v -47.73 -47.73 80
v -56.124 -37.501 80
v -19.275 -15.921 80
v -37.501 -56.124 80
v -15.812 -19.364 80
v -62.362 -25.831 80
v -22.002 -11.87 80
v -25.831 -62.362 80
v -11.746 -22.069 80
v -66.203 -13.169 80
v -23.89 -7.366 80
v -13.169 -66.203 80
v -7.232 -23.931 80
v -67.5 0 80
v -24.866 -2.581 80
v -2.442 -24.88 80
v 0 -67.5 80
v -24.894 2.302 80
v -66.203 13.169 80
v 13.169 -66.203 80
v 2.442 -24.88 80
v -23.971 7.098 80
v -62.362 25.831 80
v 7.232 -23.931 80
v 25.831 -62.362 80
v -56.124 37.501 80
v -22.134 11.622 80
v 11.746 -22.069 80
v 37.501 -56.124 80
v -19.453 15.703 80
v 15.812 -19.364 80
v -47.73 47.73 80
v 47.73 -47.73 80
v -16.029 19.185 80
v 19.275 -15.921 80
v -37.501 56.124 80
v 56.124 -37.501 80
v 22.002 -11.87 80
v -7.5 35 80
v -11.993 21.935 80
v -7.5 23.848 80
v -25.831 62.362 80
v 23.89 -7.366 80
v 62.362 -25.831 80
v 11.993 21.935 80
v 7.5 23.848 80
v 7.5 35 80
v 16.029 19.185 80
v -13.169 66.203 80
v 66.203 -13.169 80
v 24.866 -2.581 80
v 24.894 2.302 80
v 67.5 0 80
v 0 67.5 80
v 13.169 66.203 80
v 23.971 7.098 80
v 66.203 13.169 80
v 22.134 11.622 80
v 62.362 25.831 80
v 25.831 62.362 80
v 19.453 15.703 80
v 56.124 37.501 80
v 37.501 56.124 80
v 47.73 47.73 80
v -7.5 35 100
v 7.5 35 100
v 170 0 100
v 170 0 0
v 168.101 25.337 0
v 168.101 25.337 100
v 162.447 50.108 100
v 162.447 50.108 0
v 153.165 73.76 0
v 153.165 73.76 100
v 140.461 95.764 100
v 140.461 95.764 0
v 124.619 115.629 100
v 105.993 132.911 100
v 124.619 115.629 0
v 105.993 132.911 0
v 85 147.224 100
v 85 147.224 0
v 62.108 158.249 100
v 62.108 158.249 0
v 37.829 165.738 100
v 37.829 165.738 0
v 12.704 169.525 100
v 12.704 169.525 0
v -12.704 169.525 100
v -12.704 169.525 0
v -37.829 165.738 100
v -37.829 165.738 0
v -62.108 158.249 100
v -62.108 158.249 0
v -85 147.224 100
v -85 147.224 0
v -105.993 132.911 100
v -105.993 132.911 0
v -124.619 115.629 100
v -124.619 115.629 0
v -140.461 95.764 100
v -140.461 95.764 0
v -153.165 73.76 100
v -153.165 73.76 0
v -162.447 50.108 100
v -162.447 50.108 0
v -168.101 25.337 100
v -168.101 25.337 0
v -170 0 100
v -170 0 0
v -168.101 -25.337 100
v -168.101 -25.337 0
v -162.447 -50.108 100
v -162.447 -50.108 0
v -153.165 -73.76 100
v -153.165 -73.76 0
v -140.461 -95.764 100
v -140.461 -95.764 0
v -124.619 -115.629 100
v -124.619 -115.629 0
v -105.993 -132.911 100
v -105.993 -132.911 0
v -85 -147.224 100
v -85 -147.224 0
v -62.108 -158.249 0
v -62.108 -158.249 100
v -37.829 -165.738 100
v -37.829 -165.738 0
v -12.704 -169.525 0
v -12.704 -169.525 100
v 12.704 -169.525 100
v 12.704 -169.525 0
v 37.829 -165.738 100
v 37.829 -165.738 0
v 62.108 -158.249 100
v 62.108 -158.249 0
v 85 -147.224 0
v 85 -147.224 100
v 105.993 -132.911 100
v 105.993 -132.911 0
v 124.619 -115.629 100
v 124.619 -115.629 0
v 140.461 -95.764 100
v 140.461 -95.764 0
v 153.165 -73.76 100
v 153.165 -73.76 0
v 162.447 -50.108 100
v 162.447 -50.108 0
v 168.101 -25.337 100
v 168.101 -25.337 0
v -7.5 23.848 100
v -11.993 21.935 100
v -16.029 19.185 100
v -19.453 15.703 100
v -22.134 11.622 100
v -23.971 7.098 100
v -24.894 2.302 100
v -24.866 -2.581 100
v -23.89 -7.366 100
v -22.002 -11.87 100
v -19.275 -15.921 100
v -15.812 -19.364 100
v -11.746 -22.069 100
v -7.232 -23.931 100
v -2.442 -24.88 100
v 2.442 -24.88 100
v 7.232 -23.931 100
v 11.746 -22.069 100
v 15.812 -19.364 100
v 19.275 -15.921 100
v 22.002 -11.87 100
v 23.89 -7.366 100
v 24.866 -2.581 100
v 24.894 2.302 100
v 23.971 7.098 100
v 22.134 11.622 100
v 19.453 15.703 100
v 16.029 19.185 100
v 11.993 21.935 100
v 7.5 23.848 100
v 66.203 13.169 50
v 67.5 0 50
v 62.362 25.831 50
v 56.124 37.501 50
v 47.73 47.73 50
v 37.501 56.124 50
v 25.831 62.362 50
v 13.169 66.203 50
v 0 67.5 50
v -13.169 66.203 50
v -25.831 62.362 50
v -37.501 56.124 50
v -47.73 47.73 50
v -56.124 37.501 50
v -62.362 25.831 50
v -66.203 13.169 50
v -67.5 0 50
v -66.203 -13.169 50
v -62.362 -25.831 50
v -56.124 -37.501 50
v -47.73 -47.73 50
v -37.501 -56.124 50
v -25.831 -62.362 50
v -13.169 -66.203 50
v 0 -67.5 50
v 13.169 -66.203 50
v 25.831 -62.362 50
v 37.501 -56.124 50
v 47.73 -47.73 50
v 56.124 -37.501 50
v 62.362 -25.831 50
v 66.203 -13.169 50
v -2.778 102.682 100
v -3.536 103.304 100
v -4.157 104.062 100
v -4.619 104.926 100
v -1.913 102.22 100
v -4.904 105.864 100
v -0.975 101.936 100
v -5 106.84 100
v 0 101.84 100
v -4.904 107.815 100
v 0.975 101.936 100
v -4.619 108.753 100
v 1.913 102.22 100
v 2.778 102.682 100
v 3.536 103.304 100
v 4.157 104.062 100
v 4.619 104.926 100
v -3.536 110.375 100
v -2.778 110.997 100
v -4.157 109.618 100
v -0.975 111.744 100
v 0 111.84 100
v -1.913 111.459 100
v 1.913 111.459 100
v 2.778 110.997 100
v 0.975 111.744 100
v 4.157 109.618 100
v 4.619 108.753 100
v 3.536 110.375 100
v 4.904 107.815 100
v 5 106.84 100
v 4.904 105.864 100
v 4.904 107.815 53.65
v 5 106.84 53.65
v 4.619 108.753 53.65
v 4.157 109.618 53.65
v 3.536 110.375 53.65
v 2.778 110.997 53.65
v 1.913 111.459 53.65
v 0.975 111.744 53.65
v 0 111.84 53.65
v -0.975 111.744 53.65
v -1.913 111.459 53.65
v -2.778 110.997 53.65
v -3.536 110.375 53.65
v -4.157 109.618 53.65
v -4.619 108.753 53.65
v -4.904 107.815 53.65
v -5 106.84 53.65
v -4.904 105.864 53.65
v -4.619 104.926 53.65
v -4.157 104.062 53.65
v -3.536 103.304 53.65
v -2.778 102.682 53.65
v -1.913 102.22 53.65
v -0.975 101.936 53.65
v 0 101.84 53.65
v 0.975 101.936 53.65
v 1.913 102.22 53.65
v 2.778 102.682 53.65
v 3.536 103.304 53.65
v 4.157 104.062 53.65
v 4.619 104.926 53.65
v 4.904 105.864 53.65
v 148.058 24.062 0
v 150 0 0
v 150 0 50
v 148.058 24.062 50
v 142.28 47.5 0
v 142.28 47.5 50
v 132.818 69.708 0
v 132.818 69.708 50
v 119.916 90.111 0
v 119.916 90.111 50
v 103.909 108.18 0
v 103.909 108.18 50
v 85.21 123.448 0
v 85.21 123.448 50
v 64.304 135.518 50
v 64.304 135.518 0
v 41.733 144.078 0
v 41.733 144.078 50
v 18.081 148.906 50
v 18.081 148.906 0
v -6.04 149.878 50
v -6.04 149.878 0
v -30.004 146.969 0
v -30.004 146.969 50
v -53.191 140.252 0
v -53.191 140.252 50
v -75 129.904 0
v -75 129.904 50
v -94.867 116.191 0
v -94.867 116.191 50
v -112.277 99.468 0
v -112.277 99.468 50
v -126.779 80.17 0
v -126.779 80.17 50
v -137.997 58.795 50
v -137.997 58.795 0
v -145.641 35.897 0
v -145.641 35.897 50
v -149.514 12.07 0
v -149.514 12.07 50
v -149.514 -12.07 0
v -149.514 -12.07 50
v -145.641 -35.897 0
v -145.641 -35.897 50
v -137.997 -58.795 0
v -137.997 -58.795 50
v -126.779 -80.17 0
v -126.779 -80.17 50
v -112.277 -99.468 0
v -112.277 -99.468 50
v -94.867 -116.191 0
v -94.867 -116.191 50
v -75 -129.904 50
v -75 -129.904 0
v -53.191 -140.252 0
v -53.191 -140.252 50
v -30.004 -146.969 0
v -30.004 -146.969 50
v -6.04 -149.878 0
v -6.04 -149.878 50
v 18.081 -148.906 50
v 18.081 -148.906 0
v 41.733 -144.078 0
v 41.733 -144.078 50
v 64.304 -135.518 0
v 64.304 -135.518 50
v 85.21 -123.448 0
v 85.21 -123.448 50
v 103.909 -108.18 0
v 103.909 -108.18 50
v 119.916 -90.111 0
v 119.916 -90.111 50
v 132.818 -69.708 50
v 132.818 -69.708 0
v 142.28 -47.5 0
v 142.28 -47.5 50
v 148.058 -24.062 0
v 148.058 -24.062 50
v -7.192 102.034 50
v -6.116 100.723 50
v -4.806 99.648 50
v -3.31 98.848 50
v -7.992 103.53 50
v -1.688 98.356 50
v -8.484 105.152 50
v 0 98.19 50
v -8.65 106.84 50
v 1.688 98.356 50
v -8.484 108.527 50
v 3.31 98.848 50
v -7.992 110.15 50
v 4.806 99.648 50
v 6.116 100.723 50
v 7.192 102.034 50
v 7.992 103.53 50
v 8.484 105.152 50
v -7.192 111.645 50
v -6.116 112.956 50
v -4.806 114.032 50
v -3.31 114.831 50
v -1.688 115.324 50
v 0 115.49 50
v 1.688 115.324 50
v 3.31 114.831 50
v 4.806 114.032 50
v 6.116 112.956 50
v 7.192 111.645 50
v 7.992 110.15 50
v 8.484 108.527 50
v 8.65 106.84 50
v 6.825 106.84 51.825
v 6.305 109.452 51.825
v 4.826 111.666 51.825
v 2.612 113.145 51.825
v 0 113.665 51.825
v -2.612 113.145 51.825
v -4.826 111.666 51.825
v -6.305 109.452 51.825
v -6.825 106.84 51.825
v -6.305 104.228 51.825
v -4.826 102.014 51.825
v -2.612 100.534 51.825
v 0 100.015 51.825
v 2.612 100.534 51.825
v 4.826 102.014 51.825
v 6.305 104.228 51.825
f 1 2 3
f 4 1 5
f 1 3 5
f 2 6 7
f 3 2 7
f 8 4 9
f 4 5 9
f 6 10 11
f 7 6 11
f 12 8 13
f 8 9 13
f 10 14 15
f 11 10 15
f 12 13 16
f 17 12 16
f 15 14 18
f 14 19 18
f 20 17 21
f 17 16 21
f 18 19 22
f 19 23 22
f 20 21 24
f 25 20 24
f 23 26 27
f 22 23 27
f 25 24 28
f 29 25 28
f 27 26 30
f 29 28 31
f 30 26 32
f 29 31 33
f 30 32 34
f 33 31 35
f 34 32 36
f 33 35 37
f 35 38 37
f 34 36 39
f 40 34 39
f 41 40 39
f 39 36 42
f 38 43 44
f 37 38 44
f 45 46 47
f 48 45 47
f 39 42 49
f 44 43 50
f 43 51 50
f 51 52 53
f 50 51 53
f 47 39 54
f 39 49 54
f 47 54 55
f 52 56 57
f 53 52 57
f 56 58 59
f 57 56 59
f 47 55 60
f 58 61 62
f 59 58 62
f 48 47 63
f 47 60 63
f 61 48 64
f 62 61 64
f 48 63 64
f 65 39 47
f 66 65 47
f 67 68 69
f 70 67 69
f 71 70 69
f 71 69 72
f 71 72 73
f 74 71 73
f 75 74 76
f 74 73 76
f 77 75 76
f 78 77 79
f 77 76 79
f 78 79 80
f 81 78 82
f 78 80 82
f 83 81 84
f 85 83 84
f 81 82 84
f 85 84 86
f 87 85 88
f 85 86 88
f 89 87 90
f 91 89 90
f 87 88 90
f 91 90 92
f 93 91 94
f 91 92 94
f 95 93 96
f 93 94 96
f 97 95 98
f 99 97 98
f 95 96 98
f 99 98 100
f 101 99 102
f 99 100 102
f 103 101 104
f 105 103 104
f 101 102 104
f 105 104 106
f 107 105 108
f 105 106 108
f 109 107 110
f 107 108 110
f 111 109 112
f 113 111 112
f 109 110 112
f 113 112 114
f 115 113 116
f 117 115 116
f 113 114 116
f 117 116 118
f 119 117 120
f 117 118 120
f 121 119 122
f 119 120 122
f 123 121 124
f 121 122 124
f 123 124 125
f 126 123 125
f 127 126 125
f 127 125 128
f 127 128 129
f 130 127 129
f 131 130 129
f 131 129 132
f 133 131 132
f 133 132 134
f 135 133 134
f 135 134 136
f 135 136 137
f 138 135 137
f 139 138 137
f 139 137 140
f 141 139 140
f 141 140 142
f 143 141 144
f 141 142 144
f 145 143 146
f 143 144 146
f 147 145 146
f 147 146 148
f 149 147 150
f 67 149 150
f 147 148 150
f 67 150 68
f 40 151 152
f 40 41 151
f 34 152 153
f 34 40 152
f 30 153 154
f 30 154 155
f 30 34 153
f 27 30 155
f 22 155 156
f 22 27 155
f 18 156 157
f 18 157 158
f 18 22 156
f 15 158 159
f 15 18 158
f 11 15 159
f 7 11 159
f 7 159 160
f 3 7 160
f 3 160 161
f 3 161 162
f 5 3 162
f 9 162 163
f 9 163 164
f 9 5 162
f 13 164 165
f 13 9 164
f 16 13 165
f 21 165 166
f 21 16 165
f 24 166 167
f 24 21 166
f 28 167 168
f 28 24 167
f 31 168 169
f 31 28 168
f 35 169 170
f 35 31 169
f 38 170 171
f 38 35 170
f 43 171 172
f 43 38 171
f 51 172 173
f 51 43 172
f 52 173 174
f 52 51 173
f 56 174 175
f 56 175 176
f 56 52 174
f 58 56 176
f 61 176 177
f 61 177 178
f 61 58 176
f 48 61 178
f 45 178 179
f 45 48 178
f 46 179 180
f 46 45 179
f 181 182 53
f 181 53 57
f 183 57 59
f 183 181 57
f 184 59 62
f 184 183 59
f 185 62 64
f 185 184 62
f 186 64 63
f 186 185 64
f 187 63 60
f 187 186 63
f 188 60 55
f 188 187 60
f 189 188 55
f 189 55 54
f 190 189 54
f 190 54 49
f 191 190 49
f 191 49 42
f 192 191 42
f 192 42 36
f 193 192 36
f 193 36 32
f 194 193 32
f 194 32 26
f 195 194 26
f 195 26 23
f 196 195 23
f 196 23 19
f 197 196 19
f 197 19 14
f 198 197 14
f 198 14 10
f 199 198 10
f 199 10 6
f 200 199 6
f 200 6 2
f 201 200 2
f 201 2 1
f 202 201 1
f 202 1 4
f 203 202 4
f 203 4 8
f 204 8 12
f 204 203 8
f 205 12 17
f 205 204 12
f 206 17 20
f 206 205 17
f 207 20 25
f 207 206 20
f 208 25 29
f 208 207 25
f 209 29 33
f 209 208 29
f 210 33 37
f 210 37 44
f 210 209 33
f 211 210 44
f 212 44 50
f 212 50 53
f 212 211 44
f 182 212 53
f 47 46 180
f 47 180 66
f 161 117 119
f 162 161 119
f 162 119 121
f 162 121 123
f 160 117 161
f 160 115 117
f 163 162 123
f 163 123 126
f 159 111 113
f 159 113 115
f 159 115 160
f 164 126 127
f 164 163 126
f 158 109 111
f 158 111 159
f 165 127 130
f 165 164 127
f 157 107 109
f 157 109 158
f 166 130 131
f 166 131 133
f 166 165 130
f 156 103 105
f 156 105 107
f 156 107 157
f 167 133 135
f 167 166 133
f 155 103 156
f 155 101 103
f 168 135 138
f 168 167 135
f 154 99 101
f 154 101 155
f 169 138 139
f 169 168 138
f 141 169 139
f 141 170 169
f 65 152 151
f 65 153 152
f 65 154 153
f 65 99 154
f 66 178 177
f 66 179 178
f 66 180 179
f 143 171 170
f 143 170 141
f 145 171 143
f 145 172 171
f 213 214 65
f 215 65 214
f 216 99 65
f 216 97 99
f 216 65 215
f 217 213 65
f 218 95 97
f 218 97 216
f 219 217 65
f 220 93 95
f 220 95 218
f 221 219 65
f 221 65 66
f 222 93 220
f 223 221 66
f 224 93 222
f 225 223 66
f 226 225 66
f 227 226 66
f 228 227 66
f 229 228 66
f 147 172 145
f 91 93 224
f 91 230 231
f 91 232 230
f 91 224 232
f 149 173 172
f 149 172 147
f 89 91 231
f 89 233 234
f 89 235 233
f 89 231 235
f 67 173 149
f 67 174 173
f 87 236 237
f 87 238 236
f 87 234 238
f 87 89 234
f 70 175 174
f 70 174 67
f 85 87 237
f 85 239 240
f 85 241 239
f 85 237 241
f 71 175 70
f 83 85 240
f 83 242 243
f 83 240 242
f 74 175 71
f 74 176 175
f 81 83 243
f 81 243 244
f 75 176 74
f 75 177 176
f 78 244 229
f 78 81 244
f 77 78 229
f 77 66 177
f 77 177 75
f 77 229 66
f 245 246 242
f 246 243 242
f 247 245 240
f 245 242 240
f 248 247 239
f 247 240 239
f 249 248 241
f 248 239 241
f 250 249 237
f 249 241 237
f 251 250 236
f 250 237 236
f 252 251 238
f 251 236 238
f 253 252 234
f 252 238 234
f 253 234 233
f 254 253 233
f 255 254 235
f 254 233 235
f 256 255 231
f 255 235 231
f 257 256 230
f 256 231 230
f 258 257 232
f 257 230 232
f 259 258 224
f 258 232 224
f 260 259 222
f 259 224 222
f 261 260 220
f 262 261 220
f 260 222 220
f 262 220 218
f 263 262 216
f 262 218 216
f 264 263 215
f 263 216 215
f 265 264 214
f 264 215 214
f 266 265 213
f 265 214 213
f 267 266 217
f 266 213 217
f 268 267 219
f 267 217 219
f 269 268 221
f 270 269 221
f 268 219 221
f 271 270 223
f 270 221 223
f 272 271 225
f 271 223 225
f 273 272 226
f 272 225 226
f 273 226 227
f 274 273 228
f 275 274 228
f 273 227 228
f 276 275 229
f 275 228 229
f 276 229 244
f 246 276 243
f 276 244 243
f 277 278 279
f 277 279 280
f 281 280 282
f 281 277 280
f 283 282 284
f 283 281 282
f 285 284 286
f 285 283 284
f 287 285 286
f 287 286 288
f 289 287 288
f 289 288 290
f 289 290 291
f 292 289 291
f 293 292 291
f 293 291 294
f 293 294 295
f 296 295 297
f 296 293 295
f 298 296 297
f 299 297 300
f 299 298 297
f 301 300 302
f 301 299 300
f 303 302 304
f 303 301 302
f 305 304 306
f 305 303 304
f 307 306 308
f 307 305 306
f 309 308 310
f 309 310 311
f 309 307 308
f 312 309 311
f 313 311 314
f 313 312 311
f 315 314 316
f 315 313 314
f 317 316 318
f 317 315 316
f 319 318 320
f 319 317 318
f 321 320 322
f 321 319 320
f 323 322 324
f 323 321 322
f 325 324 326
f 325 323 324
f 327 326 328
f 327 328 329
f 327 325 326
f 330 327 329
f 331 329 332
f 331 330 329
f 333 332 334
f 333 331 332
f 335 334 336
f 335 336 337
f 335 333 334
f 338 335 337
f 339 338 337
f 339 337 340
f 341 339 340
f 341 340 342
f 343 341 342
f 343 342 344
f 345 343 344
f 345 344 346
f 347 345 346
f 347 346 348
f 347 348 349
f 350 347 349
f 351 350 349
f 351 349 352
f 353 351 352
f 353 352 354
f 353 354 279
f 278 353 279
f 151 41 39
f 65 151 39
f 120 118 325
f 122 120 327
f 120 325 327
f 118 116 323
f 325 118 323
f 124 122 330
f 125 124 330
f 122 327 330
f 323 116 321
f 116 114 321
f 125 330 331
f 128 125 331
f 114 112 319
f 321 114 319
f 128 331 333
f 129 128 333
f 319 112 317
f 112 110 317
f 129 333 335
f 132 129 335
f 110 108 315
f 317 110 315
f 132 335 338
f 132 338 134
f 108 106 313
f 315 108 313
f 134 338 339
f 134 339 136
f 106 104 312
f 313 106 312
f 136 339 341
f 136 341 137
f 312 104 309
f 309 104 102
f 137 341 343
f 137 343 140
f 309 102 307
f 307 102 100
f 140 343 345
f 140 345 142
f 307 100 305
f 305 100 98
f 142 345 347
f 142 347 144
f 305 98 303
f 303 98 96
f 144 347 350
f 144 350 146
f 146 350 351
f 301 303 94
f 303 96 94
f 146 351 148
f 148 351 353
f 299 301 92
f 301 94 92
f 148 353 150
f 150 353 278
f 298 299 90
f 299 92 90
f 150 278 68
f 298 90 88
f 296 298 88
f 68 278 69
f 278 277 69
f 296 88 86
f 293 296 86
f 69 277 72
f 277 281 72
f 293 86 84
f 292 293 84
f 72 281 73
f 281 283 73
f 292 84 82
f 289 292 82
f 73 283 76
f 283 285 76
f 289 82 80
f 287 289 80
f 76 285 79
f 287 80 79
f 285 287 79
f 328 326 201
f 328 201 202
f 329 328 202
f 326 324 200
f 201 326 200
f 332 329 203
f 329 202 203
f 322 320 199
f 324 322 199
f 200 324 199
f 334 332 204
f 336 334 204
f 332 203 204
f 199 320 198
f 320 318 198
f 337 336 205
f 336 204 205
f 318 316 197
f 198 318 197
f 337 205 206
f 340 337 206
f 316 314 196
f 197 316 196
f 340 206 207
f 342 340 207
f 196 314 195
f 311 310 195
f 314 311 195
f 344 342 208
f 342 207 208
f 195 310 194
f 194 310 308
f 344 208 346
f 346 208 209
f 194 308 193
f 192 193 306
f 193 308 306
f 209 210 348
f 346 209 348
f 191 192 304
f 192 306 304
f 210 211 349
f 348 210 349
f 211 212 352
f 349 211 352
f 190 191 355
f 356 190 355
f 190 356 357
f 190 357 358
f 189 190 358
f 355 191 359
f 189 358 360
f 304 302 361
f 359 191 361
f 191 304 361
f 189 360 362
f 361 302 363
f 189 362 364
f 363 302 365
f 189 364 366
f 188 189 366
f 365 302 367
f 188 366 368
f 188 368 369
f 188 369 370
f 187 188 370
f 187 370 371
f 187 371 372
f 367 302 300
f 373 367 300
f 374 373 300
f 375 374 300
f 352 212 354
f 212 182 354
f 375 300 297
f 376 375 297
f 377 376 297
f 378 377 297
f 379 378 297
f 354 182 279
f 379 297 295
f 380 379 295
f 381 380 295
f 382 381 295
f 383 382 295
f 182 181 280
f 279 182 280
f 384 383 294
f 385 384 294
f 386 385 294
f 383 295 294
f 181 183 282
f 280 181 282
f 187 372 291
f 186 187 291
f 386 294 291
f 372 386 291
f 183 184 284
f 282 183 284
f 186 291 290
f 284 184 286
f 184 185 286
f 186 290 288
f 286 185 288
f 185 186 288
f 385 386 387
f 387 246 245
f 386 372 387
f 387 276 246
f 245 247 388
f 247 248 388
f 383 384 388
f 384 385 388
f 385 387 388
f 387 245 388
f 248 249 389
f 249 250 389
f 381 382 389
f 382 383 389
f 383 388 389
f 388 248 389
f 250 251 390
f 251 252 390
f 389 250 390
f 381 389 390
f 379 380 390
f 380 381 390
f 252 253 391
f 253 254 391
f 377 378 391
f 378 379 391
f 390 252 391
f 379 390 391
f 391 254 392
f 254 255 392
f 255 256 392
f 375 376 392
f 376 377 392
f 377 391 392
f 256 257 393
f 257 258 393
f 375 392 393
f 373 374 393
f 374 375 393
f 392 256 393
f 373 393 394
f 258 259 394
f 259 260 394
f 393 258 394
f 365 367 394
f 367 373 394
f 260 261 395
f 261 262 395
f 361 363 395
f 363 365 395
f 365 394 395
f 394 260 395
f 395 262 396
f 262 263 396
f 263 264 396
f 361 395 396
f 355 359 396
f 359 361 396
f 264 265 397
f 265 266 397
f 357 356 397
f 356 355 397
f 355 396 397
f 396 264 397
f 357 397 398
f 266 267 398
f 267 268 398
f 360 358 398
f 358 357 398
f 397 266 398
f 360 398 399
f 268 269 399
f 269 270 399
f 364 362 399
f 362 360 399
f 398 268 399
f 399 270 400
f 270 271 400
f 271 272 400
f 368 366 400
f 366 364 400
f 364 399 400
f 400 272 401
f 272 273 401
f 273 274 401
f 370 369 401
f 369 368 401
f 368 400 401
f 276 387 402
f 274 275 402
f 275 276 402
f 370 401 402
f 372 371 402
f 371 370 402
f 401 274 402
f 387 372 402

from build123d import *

# Parameters (mm, degrees)
CROQUIS2_R                                           = 170
CROQUIS2_R_2                                         = 150
CROQUIS2_R_3                                         = 67.5
CROQUIS2_R_4                                         = 25
SALIENTE_EXTRUIR1_DEPTH                              = 100
CROQUIS3_R                                           = 150
CORTAR_EXTRUIR1_DEPTH                                = 50
CROQUIS4_R                                           = 67.5
CORTAR_EXTRUIR3_DEPTH                                = 80
CROQUIS5_W                                           = 15
CROQUIS5_H                                           = 35
CORTAR_EXTRUIR4_DEPTH                                = 261.384331326
AVELLANADO_PARA_TORNILLO_CON_CABEZA_AVEL_D           = 10
AVELLANADO_PARA_TORNILLO_CON_CABEZA_AVEL_CSINK_D     = 17.3
AVELLANADO_PARA_TORNILLO_CON_CABEZA_AVEL_CSINK_ANGLE = 90


with BuildPart() as part:
    # Croquis2 → Saliente-Extruir1 (new body)
    # profile 1 of 3: a face of its own
    with BuildSketch(Plane.XY):
        Circle(CROQUIS2_R)
        Circle(CROQUIS2_R_2, mode=Mode.SUBTRACT)
    # profile 2 of 3: a face of its own
    with BuildSketch(Plane.XY):
        Circle(CROQUIS2_R_2)
        Circle(CROQUIS2_R_3, mode=Mode.SUBTRACT)
    # profile 3 of 3: a face of its own
    with BuildSketch(Plane.XY):
        Circle(CROQUIS2_R_3)
        Circle(CROQUIS2_R_4, mode=Mode.SUBTRACT)
    extrude(amount=SALIENTE_EXTRUIR1_DEPTH)

    # Croquis3 → Cortar-Extruir1 (cut)
    with BuildSketch(Plane.XY):
        Circle(CROQUIS3_R)
    extrude(amount=CORTAR_EXTRUIR1_DEPTH, mode=Mode.SUBTRACT)

    # Croquis4 → Cortar-Extruir3 (cut)
    with BuildSketch(Plane.XY):
        Circle(CROQUIS4_R)
    extrude(amount=CORTAR_EXTRUIR3_DEPTH, mode=Mode.SUBTRACT)

    # Croquis5 → Cortar-Extruir4 (cut, through all)
    with BuildSketch(Plane.XY):
        with Locations((0, 17.5)):
            Rectangle(CROQUIS5_W, CROQUIS5_H)
    extrude(amount=CORTAR_EXTRUIR4_DEPTH, mode=Mode.SUBTRACT)

    # Avellanado para tornillo con cabeza avellanada de M81 (through all)
    with Locations(Plane(origin=(0, 0, 50), x_dir=(-1, 0, 0), z_dir=(0, 0, -1))):
        with Locations((0, 106.839777093)):
            CounterSinkHole(AVELLANADO_PARA_TORNILLO_CON_CABEZA_AVEL_D / 2, AVELLANADO_PARA_TORNILLO_CON_CABEZA_AVEL_CSINK_D / 2, counter_sink_angle=AVELLANADO_PARA_TORNILLO_CON_CABEZA_AVEL_CSINK_ANGLE)


solid = part.part
